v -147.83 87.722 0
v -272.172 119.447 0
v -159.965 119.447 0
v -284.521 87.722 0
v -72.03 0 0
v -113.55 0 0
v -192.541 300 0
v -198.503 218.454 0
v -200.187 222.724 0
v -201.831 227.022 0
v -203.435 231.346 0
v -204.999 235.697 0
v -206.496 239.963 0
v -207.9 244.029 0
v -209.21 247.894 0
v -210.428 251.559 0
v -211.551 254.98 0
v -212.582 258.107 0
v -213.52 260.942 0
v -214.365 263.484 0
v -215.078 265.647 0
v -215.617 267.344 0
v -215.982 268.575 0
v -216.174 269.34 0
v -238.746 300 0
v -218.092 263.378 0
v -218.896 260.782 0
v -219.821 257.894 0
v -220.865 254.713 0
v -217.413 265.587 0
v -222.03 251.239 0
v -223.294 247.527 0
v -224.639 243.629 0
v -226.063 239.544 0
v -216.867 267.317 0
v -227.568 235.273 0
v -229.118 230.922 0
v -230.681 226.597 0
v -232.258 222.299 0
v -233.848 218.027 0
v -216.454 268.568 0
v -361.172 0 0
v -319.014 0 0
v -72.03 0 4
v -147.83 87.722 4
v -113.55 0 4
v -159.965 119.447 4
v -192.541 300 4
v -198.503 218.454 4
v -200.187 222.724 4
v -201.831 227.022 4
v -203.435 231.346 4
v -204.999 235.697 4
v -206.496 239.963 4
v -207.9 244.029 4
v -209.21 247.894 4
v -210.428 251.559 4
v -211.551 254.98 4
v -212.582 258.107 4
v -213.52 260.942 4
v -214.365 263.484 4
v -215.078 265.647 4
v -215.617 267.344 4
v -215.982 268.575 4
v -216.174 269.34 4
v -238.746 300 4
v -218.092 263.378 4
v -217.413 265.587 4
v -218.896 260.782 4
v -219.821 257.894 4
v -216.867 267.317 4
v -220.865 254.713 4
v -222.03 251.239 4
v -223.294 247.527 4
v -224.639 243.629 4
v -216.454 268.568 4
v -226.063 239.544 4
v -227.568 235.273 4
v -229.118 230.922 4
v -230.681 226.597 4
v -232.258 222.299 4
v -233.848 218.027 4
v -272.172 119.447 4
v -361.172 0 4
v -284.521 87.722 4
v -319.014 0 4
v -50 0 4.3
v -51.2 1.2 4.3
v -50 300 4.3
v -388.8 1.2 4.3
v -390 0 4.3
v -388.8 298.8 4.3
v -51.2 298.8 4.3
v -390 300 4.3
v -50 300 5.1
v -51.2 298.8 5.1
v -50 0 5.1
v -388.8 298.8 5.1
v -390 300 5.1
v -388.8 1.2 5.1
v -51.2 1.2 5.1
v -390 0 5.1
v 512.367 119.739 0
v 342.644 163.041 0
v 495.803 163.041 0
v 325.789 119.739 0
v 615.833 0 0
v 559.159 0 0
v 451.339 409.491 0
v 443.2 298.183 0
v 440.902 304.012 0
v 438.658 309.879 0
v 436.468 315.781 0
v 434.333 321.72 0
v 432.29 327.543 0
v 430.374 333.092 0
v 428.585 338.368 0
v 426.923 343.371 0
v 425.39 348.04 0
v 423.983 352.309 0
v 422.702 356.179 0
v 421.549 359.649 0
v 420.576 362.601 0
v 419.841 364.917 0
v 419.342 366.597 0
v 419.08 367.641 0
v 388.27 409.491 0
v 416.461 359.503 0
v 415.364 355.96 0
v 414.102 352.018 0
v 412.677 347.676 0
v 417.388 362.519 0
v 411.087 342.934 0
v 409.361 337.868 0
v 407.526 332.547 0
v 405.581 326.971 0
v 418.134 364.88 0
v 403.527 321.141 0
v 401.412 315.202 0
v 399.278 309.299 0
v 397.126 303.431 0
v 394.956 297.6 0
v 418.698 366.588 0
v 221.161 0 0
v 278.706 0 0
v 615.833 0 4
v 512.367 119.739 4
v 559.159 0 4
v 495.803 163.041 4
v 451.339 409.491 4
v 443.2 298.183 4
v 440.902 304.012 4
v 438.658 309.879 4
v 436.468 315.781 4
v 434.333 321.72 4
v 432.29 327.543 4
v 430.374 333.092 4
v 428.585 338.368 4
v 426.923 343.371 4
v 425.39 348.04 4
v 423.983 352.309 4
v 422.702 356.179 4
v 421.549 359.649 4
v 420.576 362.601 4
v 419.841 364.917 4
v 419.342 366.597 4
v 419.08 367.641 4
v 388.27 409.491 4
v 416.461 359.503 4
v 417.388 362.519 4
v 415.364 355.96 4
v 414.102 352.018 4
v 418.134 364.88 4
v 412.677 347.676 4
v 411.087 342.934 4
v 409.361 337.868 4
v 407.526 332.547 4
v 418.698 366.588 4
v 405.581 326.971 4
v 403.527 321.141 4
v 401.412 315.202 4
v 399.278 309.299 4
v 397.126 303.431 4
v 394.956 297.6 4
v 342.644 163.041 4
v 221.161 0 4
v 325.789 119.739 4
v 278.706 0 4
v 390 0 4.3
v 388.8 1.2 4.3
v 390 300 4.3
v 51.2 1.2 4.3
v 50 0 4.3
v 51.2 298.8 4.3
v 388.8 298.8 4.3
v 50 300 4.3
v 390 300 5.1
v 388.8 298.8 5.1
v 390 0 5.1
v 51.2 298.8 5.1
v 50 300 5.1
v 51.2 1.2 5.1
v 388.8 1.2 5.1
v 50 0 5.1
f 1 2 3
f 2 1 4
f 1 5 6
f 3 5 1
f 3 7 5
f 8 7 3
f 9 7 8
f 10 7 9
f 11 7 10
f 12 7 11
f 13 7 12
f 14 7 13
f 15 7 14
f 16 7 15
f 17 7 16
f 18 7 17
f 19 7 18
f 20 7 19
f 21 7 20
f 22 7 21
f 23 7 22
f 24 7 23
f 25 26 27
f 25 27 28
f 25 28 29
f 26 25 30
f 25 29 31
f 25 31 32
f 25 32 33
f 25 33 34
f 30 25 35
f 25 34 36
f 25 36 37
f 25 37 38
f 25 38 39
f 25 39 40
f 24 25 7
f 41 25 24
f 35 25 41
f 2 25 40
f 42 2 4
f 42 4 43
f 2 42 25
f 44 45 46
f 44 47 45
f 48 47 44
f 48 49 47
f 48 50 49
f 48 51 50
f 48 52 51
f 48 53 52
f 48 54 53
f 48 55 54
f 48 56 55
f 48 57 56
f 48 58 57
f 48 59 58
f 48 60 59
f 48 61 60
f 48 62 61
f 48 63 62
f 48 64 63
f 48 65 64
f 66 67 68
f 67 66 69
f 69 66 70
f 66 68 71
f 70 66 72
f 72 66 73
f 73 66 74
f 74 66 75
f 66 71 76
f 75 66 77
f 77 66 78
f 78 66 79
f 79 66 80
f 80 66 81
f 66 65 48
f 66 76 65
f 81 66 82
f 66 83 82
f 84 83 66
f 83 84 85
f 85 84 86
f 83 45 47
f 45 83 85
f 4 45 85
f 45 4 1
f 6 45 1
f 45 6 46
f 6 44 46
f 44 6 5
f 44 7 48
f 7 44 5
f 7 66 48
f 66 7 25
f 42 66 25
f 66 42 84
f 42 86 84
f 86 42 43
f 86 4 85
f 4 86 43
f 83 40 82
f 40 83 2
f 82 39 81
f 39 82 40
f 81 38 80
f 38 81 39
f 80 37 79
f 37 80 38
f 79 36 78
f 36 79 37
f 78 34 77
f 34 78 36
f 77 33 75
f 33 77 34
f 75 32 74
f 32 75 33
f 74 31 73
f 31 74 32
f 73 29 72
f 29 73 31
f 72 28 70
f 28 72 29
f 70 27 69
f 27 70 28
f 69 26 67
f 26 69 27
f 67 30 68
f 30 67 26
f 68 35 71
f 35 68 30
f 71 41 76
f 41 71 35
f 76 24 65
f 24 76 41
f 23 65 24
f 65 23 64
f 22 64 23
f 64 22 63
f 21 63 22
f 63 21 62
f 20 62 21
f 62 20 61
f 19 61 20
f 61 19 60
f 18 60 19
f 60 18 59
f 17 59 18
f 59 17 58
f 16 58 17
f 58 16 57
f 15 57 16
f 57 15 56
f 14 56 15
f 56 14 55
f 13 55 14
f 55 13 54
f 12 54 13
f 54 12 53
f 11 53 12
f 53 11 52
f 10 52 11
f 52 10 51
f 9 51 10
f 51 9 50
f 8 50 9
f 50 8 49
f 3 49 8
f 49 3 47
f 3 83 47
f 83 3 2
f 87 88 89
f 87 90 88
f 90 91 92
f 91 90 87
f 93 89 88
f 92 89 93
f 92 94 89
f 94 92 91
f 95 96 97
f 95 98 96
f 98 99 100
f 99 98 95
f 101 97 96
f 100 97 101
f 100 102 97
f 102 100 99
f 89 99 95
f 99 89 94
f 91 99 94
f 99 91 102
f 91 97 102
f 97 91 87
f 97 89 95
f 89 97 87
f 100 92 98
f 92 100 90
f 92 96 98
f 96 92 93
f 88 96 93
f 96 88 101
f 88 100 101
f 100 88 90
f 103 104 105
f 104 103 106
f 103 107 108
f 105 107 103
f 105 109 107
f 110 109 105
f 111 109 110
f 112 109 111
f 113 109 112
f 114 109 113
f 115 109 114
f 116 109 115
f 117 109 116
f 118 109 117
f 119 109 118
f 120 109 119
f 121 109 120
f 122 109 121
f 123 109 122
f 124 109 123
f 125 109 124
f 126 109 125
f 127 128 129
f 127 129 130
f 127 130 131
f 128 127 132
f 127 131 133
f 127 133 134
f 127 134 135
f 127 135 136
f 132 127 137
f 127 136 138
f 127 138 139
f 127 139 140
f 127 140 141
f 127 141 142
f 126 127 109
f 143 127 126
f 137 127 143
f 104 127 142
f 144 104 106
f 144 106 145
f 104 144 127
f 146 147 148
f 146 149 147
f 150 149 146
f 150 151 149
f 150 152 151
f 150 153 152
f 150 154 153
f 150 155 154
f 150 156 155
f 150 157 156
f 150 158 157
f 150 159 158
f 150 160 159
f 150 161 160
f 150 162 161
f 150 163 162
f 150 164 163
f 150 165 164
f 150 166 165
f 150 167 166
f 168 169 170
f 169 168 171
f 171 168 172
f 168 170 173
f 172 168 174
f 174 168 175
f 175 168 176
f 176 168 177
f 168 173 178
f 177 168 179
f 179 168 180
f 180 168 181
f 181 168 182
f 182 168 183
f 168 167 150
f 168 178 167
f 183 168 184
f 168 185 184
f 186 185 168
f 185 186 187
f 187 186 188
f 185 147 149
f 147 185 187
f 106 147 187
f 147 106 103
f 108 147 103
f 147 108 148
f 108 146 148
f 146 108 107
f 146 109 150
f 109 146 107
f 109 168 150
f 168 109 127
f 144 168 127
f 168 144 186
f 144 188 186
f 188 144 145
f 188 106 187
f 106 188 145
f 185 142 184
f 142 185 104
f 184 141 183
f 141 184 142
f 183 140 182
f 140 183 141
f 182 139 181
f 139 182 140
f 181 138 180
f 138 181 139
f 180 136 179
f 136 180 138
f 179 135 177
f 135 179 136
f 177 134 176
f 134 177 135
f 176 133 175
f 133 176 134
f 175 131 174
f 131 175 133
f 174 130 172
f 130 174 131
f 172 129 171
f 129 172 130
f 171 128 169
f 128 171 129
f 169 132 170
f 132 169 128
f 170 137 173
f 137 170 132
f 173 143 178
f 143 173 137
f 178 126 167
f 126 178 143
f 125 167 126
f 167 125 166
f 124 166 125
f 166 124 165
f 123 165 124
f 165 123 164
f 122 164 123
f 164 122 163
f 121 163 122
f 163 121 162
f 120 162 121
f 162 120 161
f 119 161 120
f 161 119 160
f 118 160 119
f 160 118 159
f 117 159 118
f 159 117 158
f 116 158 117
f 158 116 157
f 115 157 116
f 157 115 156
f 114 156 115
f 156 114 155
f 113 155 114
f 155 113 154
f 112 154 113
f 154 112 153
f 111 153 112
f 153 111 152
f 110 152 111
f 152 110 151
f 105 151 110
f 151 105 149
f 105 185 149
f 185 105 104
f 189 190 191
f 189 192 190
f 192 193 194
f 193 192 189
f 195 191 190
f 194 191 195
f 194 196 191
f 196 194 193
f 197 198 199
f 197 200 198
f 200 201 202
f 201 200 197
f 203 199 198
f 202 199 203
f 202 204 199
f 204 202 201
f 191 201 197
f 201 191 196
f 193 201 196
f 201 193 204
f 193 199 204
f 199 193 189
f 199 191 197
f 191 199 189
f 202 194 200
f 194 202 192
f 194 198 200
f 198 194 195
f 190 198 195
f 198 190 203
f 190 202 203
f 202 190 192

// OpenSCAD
// file: ../geometry/normalized_profile_scene.scad
//////////////////////////////////////////////////////////////////////
// LibFile: normalized_profile_scene.scad
// Project: Glyph Dossier
// FileGroup: Exact-Height Diagnostic Rendering
// FileSummary: Whole normalized A with target-height reference bounds.
//////////////////////////////////////////////////////////////////////

module normalized_reference_bounds_2d(
    target_height,
    reference_half_width,
    line_width
) {
    difference() {
        translate([0, target_height / 2])
            square(
                [
                    2 * reference_half_width,
                    target_height
                ],
                center = true
            );

        translate([0, target_height / 2])
            square(
                [
                    max(
                        0.01,
                        2 * reference_half_width
                            - 2 * line_width
                    ),
                    max(
                        0.01,
                        target_height
                            - 2 * line_width
                    )
                ],
                center = true
            );
    }
}

module render_normalized_profile(
    dossier,
    source,
    method,
    target_height,
    probe_size,
    depth,
    manual_left,
    manual_right,
    manual_bottom,
    manual_top,
    show_bounds,
    bounds_line_width,
    reference_half_width
) {
    color([0.88, 0.68, 0.24])
        normalized_glyph_3d(
            dossier,
            source,
            method,
            target_height,
            probe_size,
            depth,
            manual_left,
            manual_right,
            manual_bottom,
            manual_top
        );

    if (show_bounds)
        color([0.20, 0.45, 0.85, 0.55])
            translate([0, 0, depth + 0.3])
                linear_extrude(height = 0.8)
                    normalized_reference_bounds_2d(
                        target_height,
                        reference_half_width,
                        bounds_line_width
                    );
}
// file: ../geometry/normalized_glyph.scad
//////////////////////////////////////////////////////////////////////
// LibFile: normalized_glyph.scad
// Project: Glyph Dossier
// FileGroup: Exact-Height Geometry
// FileSummary: Center-bottom glyph normalization by three methods.
//////////////////////////////////////////////////////////////////////

module _source_text_left_baseline_2d(
    dossier,
    source,
    probe_size
) {
    font_text_2d(
        dossier[GD_GLYPH],
        source[FS_FONT_NAME],
        probe_size,
        "left",
        "baseline"
    );
}

module _source_text_center_bottom_2d(
    dossier,
    source,
    probe_size
) {
    font_text_2d(
        dossier[GD_GLYPH],
        source[FS_FONT_NAME],
        probe_size,
        "center",
        "bottom"
    );
}

module _manual_normalized_glyph_2d(
    dossier,
    source,
    target_height,
    probe_size,
    left,
    right,
    bottom,
    top
) {
    scale_factor = exact_height_scale(
        target_height,
        bottom,
        top
    );

    translate([
        normalized_center_shift_x(
            left,
            right,
            scale_factor
        ),
        normalized_bottom_shift_y(
            bottom,
            scale_factor
        )
    ])
        scale([scale_factor, scale_factor])
            _source_text_left_baseline_2d(
                dossier,
                source,
                probe_size
            );
}

module _resize_normalized_glyph_2d(
    dossier,
    source,
    target_height,
    probe_size
) {
    resize(
        [0, target_height],
        auto = [true, false]
    )
        _source_text_center_bottom_2d(
            dossier,
            source,
            probe_size
        );
}

module _textmetrics_normalized_glyph_2d(
    dossier,
    source,
    target_height,
    probe_size
) {
    if (source[FS_FONT_NAME] == "")
        let(
            metrics = textmetrics(
                text = dossier[GD_GLYPH],
                size = probe_size,
                halign = "left",
                valign = "baseline"
            ),
            scale_factor =
                target_height / metrics.size.y,
            center_x =
                metrics.position.x
                + metrics.size.x / 2
        ) {
            echo("TEXTMETRICS_PROFILE", metrics);
            echo(
                "NORMALIZATION_SCALE",
                scale_factor
            );
            echo(
                "NORMALIZED_PROFILE_WIDTH_MM",
                metrics.size.x * scale_factor
            );
            echo(
                "NORMALIZED_PROFILE_HEIGHT_MM",
                target_height
            );

            translate([
                -center_x * scale_factor,
                -metrics.position.y * scale_factor
            ])
                scale([scale_factor, scale_factor])
                    _source_text_left_baseline_2d(
                        dossier,
                        source,
                        probe_size
                    );
        }
    else
        let(
            metrics = textmetrics(
                text = dossier[GD_GLYPH],
                size = probe_size,
                font = source[FS_FONT_NAME],
                halign = "left",
                valign = "baseline"
            ),
            scale_factor =
                target_height / metrics.size.y,
            center_x =
                metrics.position.x
                + metrics.size.x / 2
        ) {
            echo("TEXTMETRICS_PROFILE", metrics);
            echo(
                "NORMALIZATION_SCALE",
                scale_factor
            );
            echo(
                "NORMALIZED_PROFILE_WIDTH_MM",
                metrics.size.x * scale_factor
            );
            echo(
                "NORMALIZED_PROFILE_HEIGHT_MM",
                target_height
            );

            translate([
                -center_x * scale_factor,
                -metrics.position.y * scale_factor
            ])
                scale([scale_factor, scale_factor])
                    _source_text_left_baseline_2d(
                        dossier,
                        source,
                        probe_size
                    );
        }
}

module normalized_glyph_2d(
    dossier,
    source,
    method,
    target_height,
    probe_size,
    manual_left,
    manual_right,
    manual_bottom,
    manual_top
) {
    if (method == "manual")
        _manual_normalized_glyph_2d(
            dossier,
            source,
            target_height,
            probe_size,
            manual_left,
            manual_right,
            manual_bottom,
            manual_top
        );
    else if (method == "textmetrics")
        _textmetrics_normalized_glyph_2d(
            dossier,
            source,
            target_height,
            probe_size
        );
    else
        _resize_normalized_glyph_2d(
            dossier,
            source,
            target_height,
            probe_size
        );
}

module normalized_glyph_3d(
    dossier,
    source,
    method,
    target_height,
    probe_size,
    depth,
    manual_left,
    manual_right,
    manual_bottom,
    manual_top
) {
    linear_extrude(height = depth)
        normalized_glyph_2d(
            dossier,
            source,
            method,
            target_height,
            probe_size,
            manual_left,
            manual_right,
            manual_bottom,
            manual_top
        );
}
// file: ../geometry/glyph_profile.scad
//////////////////////////////////////////////////////////////////////
// LibFile: glyph_profile.scad
// Project: Glyph Dossier
// FileGroup: Source Adapter
// FileSummary: Font-backed text, glyph, source, and extrusion adapters.
//////////////////////////////////////////////////////////////////////

module font_text_2d(
    value,
    font_name,
    nominal_size,
    halign_value = "center",
    valign_value = "baseline"
) {
    if (font_name == "")
        text(
            text = value,
            size = nominal_size,
            halign = halign_value,
            valign = valign_value
        );
    else
        text(
            text = value,
            size = nominal_size,
            font = font_name,
            halign = halign_value,
            valign = valign_value
        );
}

module font_glyph_2d(glyph, font_name, nominal_size) {
    font_text_2d(
        glyph,
        font_name,
        nominal_size,
        "center",
        "baseline"
    );
}

module glyph_source_2d(
    dossier,
    source_kind,
    font_name,
    nominal_size
) {
    assert(
        source_kind == "font",
        str("Source adapter does not implement kind: ", source_kind)
    );

    font_glyph_2d(
        dossier[GD_GLYPH],
        font_name,
        nominal_size
    );
}

module glyph_profile_3d(
    dossier,
    source_kind,
    font_name,
    nominal_size,
    depth
) {
    linear_extrude(height = depth)
        glyph_source_2d(
            dossier,
            source_kind,
            font_name,
            nominal_size
        );
}

module glyph_source_record_2d(
    dossier,
    source,
    nominal_size
) {
    glyph_source_2d(
        dossier,
        source[FS_KIND],
        source[FS_FONT_NAME],
        nominal_size
    );
}

module glyph_source_record_3d(
    dossier,
    source,
    nominal_size,
    depth
) {
    glyph_profile_3d(
        dossier,
        source[FS_KIND],
        source[FS_FONT_NAME],
        nominal_size,
        depth
    );
}
// file: ../lib/normalization.scad
//////////////////////////////////////////////////////////////////////
// LibFile: normalization.scad
// Project: Glyph Dossier
// FileGroup: Normalization Mathematics
// FileSummary: Manual-bound scale and final-dimension calculations.
//////////////////////////////////////////////////////////////////////

function profile_bounds_known(
    left,
    right,
    bottom,
    top
) =
    left != OBS_UNKNOWN
    && right != OBS_UNKNOWN
    && bottom != OBS_UNKNOWN
    && top != OBS_UNKNOWN;

function profile_bounds_valid(
    left,
    right,
    bottom,
    top
) =
    profile_bounds_known(left, right, bottom, top)
    && left < right
    && bottom < top;

function profile_observed_width(left, right) =
    right - left;

function profile_observed_height(bottom, top) =
    top - bottom;

function exact_height_scale(
    target_height,
    observed_bottom,
    observed_top
) =
    target_height
    / profile_observed_height(
        observed_bottom,
        observed_top
    );

function normalized_profile_width(
    target_height,
    observed_left,
    observed_right,
    observed_bottom,
    observed_top
) =
    profile_observed_width(
        observed_left,
        observed_right
    )
    * exact_height_scale(
        target_height,
        observed_bottom,
        observed_top
    );

function normalized_center_shift_x(
    observed_left,
    observed_right,
    scale_factor
) =
    -(
        observed_left + observed_right
    ) / 2 * scale_factor;

function normalized_bottom_shift_y(
    observed_bottom,
    scale_factor
) =
    -observed_bottom * scale_factor;
// file: ../lib/lookup.scad
//////////////////////////////////////////////////////////////////////
// LibFile: lookup.scad
// Project: Glyph Dossier
// FileGroup: Exact Lookup
// FileSummary: Requires exact records and source-glyph observations.
//////////////////////////////////////////////////////////////////////

function named_matches(records, name) = [
    for (record = records)
        if (record_name(record) == name)
            record
];

function named_record(records, name, record_kind = "record") =
    let(matches = named_matches(records, name))
    assert(
        len(matches) == 1,
        str(
            "Expected exactly one ",
            record_kind,
            " named ",
            name,
            "; found ",
            len(matches)
        )
    )
    matches[0];

function exact_name_count(records, name) =
    len(named_matches(records, name));

function observation_matches(
    records,
    source_id,
    glyph_id
) = [
    for (record = records)
        if (
            record[OB_SOURCE_ID] == source_id
            && record[OB_GLYPH_ID] == glyph_id
        )
            record
];

function exact_observation_count(
    records,
    source_id,
    glyph_id
) =
    len(observation_matches(records, source_id, glyph_id));

function source_glyph_observation(
    records,
    source_id,
    glyph_id
) =
    let(matches = observation_matches(records, source_id, glyph_id))
    assert(
        len(matches) == 1,
        str(
            "Expected one observation for source ",
            source_id,
            " and glyph ",
            glyph_id,
            "; found ",
            len(matches)
        )
    )
    matches[0];
// file: ../config/workbenches.scad
//////////////////////////////////////////////////////////////////////
// LibFile: workbenches.scad
// Project: Glyph Dossier
// FileGroup: Workbench Contracts
// FileSummary: Declares supported workbenches and render modes.
//////////////////////////////////////////////////////////////////////

VALID_WORKBENCHES = [
    "development",
    "laboratory",
    "profile",
    "contact_sheet",
    "font_source",
    "font_inventory",
    "glyph_observation",
    "glyph_comparison",
    "source_contact_sheet",
    "a_normalized_profile",
    "a_section_plan",
    "a_section_layout",
    "a_section_export",
    "catalog"
];

VALID_RENDER_MODES = [
    "dossier",
    "profile_2d",
    "profile_3d",
    "contact_sheet",
    "source_sample",
    "font_inventory",
    "observation",
    "comparison",
    "source_contact_sheet",
    "a_normalized_profile",
    "a_section_plan",
    "a_section_layout",
    "a_section_export",
    "report_only"
];

VALID_SOURCE_KINDS = [
    "font"
];

VALID_PROBE_ORIENTATIONS = [
    "horizontal",
    "vertical"
];

VALID_NORMALIZATION_METHODS = [
    "resize",
    "manual",
    "textmetrics"
];

function value_in_list(values, value) =
    len([for (candidate = values) if (candidate == value) candidate]) > 0;

module validate_workbench_selection(
    workbench_name,
    render_mode,
    source_kind,
    stroke_probe_orientation = "vertical",
    gap_probe_orientation = "horizontal"
) {
    assert(
        value_in_list(VALID_WORKBENCHES, workbench_name),
        str("Unknown workbench: ", workbench_name)
    );
    assert(
        value_in_list(VALID_RENDER_MODES, render_mode),
        str("Unknown render mode: ", render_mode)
    );
    assert(
        value_in_list(VALID_SOURCE_KINDS, source_kind),
        str("Unsupported source kind: ", source_kind)
    );
    assert(
        value_in_list(
            VALID_PROBE_ORIENTATIONS,
            stroke_probe_orientation
        ),
        str(
            "Unknown stroke probe orientation: ",
            stroke_probe_orientation
        )
    );
    assert(
        value_in_list(
            VALID_PROBE_ORIENTATIONS,
            gap_probe_orientation
        ),
        str(
            "Unknown gap probe orientation: ",
            gap_probe_orientation
        )
    );
}
// file: ../config/sources.scad
//////////////////////////////////////////////////////////////////////
// LibFile: sources.scad
// Project: Glyph Dossier
// FileGroup: Registry Routing
// FileSummary: Exposes configurable laboratory font sources.
//////////////////////////////////////////////////////////////////////

FONT_SOURCES = LABORATORY_FONT_SOURCES;
// file: ../registries/laboratory_sources.scad
//////////////////////////////////////////////////////////////////////
// LibFile: laboratory_sources.scad
// Project: Glyph Dossier
// FileGroup: Mutable Source Registry
// FileSummary: Three stable configurable font-source identities.
//////////////////////////////////////////////////////////////////////

LABORATORY_FONT_SOURCES = [
    font_source(
        "SRC_1",
        "font",
        wb_source_1_label,
        wb_source_1_font_name,
        wb_source_1_license,
        wb_source_1_url,
        wb_source_1_revision,
        "active"
    ),
    font_source(
        "SRC_2",
        "font",
        wb_source_2_label,
        wb_source_2_font_name,
        wb_source_2_license,
        wb_source_2_url,
        wb_source_2_revision,
        "active"
    ),
    font_source(
        "SRC_3",
        "font",
        wb_source_3_label,
        wb_source_3_font_name,
        wb_source_3_license,
        wb_source_3_url,
        wb_source_3_revision,
        "active"
    )
];
// file: ../config/glyphs.scad
//////////////////////////////////////////////////////////////////////
// LibFile: glyphs.scad
// Project: Glyph Dossier
// FileGroup: Registry Composition
// FileSummary: Exposes the complete character-analysis registry.
//////////////////////////////////////////////////////////////////////

ALL_GLYPHS = concat(
    UPPERCASE_GLYPHS,
    LOWERCASE_GLYPHS,
    DIGIT_GLYPHS,
    PUNCTUATION_GLYPHS
);
// file: ../registries/punctuation.scad
//////////////////////////////////////////////////////////////////////
// LibFile: punctuation_glyphs.scad
// Project: Glyph Dossier
// FileGroup: Character Registry
// FileSummary: Character-level dossiers for question, exclamation, colon, and semicolon.
//////////////////////////////////////////////////////////////////////

PUNCTUATION_GLYPHS = [
    glyph_dossier(
        "P_question",
        "?",
        "punctuation",
        "curved_mark_dot",
        2,
        2,
        0,
        0,
        "cap_punctuation",
        ["upper_curve", "narrow_transition", "terminal", "separate_dot"],
        ["dot_loss", "component_assignment", "curve_cut", "narrow_transition"],
        ["curve_shape", "dot_shape", "terminal_angle"],
        "primary",
        "Primary punctuation test combining a complex main mark and separate dot."
    ),
    glyph_dossier(
        "P_exclamation",
        "!",
        "punctuation",
        "stem_dot",
        2,
        2,
        0,
        0,
        "cap_punctuation",
        ["main_stem", "separate_dot"],
        ["dot_loss", "stem_fragment", "component_assignment"],
        ["tapered_stem", "rectangular_stem", "dot_shape"],
        "primary",
        "Primary two-component punctuation control glyph."
    ),
    glyph_dossier(
        "P_colon",
        ":",
        "punctuation",
        "paired_dots",
        2,
        2,
        0,
        0,
        "x_punctuation",
        ["upper_dot", "lower_dot"],
        ["component_loss", "component_assignment", "small_part"],
        ["round_dots", "square_dots"],
        "primary",
        "Primary test consisting entirely of disconnected small components."
    ),
    glyph_dossier(
        "P_semicolon",
        ";",
        "punctuation",
        "dot_descending_mark",
        2,
        2,
        0,
        0,
        "descender_punctuation",
        ["upper_dot", "lower_comma_tail"],
        ["component_loss", "tail_fragment", "component_assignment"],
        ["tail_angle", "dot_shape"],
        "primary",
        "Tests disconnected punctuation with a descending curved component."
    )
];
// file: ../registries/digits.scad
//////////////////////////////////////////////////////////////////////
// LibFile: digit_glyphs.scad
// Project: Glyph Dossier
// FileGroup: Character Registry
// FileSummary: Character-level dossiers for digits 0 through 9.
//////////////////////////////////////////////////////////////////////

DIGIT_GLYPHS = [
    glyph_dossier(
        "D_0",
        "0",
        "digit",
        "closed_ring",
        1,
        1,
        1,
        1,
        "digit_height",
        ["outer_curve", "counter", "continuous_ring"],
        ["counter_collapse", "ring_thickness_loss", "letter_confusion"],
        ["slashed_zero", "dotted_zero", "oval_width"],
        "primary",
        "Primary digit ring test and distinction from uppercase O."
    ),
    glyph_dossier(
        "D_1",
        "1",
        "digit",
        "stem_flag_base",
        1,
        1,
        0,
        0,
        "digit_height",
        ["main_stem", "possible_flag", "possible_base"],
        ["narrow_part", "flag_fragment", "base_fragment"],
        ["plain_stem", "top_flag", "bottom_base", "serifed"],
        "primary",
        "Primary font-variation and narrow-digit test."
    ),
    glyph_dossier(
        "D_2",
        "2",
        "digit",
        "curve_diagonal_base",
        1,
        1,
        0,
        0,
        "digit_height",
        ["upper_curve", "diagonal_transition", "bottom_bar"],
        ["curve_diagonal_cut", "bottom_bar_fragment", "thin_transition"],
        ["flat_or_curved_base", "diagonal_angle"],
        "primary",
        "Primary mixed curve, diagonal, and horizontal test."
    ),
    glyph_dossier(
        "D_3",
        "3",
        "digit",
        "double_open_bowl",
        1,
        1,
        0,
        0,
        "digit_height",
        ["upper_curve", "lower_curve", "central_waist"],
        ["waist_fragment", "curve_cut", "terminal_fragment"],
        ["upper_lower_balance", "flat_or_rounded_spine"],
        "coverage",
        "Tests two open curved lobes and a narrow waist."
    ),
    glyph_dossier(
        "D_4",
        "4",
        "digit",
        "crossbar_diagonal_stem",
        1,
        1,
        0,
        1,
        "digit_height",
        ["diagonal", "vertical_stem", "crossbar", "possible_counter"],
        ["form_substitution", "crossbar_cut", "counter_collapse", "junction_cut"],
        ["open_four", "closed_four", "crossbar_height"],
        "primary",
        "Primary digit form-variation and junction test."
    ),
    glyph_dossier(
        "D_5",
        "5",
        "digit",
        "top_stem_lower_curve",
        1,
        1,
        0,
        0,
        "digit_height",
        ["top_bar", "upper_stem", "lower_curve"],
        ["curve_stem_cut", "top_bar_fragment", "waist_fragment"],
        ["flat_or_curved_top", "lower_bowl_size"],
        "coverage",
        "Tests abrupt transition from rectilinear to curved geometry."
    ),
    glyph_dossier(
        "D_6",
        "6",
        "digit",
        "loop_open_tail",
        1,
        1,
        1,
        1,
        "digit_height",
        ["lower_loop", "counter", "upper_open_curve"],
        ["counter_collapse", "neck_cut", "terminal_fragment"],
        ["loop_size", "terminal_angle"],
        "coverage",
        "Tests one counter with an open upper continuation."
    ),
    glyph_dossier(
        "D_7",
        "7",
        "digit",
        "topbar_diagonal",
        1,
        1,
        0,
        0,
        "digit_height",
        ["top_bar", "long_diagonal", "possible_crossbar"],
        ["diagonal_cut", "top_bar_fragment", "crossbar_fragment"],
        ["crossed_seven", "plain_seven", "serifed"],
        "coverage",
        "Tests a long diagonal and optional crossbar."
    ),
    glyph_dossier(
        "D_8",
        "8",
        "digit",
        "double_closed_loop",
        1,
        1,
        2,
        2,
        "digit_height",
        ["upper_loop", "lower_loop", "two_counters", "central_waist"],
        ["counter_collapse", "waist_fragment", "loop_boundary_cut"],
        ["upper_lower_balance", "waist_width"],
        "primary",
        "Primary two-counter digit test."
    ),
    glyph_dossier(
        "D_9",
        "9",
        "digit",
        "loop_descending_tail",
        1,
        1,
        1,
        1,
        "digit_height",
        ["upper_loop", "counter", "lower_open_tail"],
        ["counter_collapse", "neck_cut", "tail_fragment"],
        ["loop_size", "tail_angle"],
        "coverage",
        "Tests one upper counter with a descending open continuation."
    )
];
// file: ../lib/schema.scad
//////////////////////////////////////////////////////////////////////
// LibFile: schema.scad
// Project: Glyph Dossier
// FileGroup: Record Schema
// FileSummary: Project, glyph, source, and observation records.
//////////////////////////////////////////////////////////////////////

PR_NAME = 0;
PR_KIND = 1;
PR_EDITION = 2;
PR_SCOPE = 3;
PR_BASELINE = 4;
PR_STATUS = 5;

function glyph_project(
    name,
    kind,
    edition,
    scope,
    baseline,
    status
) = [
    name,
    kind,
    edition,
    scope,
    baseline,
    status
];

GD_ID = 0;
GD_GLYPH = 1;
GD_GROUP = 2;
GD_ARCHETYPE = 3;
GD_COMPONENTS_MIN = 4;
GD_COMPONENTS_MAX = 5;
GD_COUNTERS_MIN = 6;
GD_COUNTERS_MAX = 7;
GD_VERTICAL_CLASS = 8;
GD_FEATURES = 9;
GD_RISKS = 10;
GD_VARIANTS = 11;
GD_PRIORITY = 12;
GD_NOTE = 13;

function glyph_dossier(
    id,
    glyph,
    group,
    archetype,
    components_min,
    components_max,
    counters_min,
    counters_max,
    vertical_class,
    features,
    risks,
    variants,
    priority,
    note
) = [
    id,
    glyph,
    group,
    archetype,
    components_min,
    components_max,
    counters_min,
    counters_max,
    vertical_class,
    features,
    risks,
    variants,
    priority,
    note
];

FS_ID = 0;
FS_KIND = 1;
FS_LABEL = 2;
FS_FONT_NAME = 3;
FS_LICENSE = 4;
FS_URL = 5;
FS_REVISION = 6;
FS_STATUS = 7;

function font_source(
    id,
    kind,
    label,
    font_name,
    license_name,
    source_url,
    revision,
    status
) = [
    id,
    kind,
    label,
    font_name,
    license_name,
    source_url,
    revision,
    status
];

OBS_UNKNOWN = -999999;

OB_ID = 0;
OB_SOURCE_ID = 1;
OB_GLYPH_ID = 2;
OB_STATUS = 3;
OB_VARIANT = 4;
OB_COMPONENTS = 5;
OB_COUNTERS = 6;
OB_LEFT = 7;
OB_RIGHT = 8;
OB_BOTTOM = 9;
OB_TOP = 10;
OB_MIN_STROKE = 11;
OB_MIN_GAP = 12;
OB_NOTE = 13;

function glyph_observation(
    id,
    source_id,
    glyph_id,
    status,
    variant,
    components,
    counters,
    left_extent,
    right_extent,
    bottom_extent,
    top_extent,
    minimum_stroke,
    minimum_gap,
    note
) = [
    id,
    source_id,
    glyph_id,
    status,
    variant,
    components,
    counters,
    left_extent,
    right_extent,
    bottom_extent,
    top_extent,
    minimum_stroke,
    minimum_gap,
    note
];

function observation_value_known(value) =
    value != OBS_UNKNOWN;

function observation_has_bounds(observation) =
    observation_value_known(observation[OB_LEFT])
    && observation_value_known(observation[OB_RIGHT])
    && observation_value_known(observation[OB_BOTTOM])
    && observation_value_known(observation[OB_TOP]);

function observation_width(observation) =
    observation_has_bounds(observation)
    ? observation[OB_RIGHT] - observation[OB_LEFT]
    : OBS_UNKNOWN;

function observation_height(observation) =
    observation_has_bounds(observation)
    ? observation[OB_TOP] - observation[OB_BOTTOM]
    : OBS_UNKNOWN;

function record_name(record) = record[0];
// main file
//////////////////////////////////////////////////////////////////////
// LibFile: normalized_a_render_contract.scad
// Project: Glyph Dossier
// FileGroup: Contract Tests
// FileSummary: Portable resize and manual normalization geometry.
//////////////////////////////////////////////////////////////////////

include <../lib/schema.scad>
include <../config/defaults.scad>

include <../registries/uppercase.scad>
include <../registries/lowercase.scad>
include <../registries/digits.scad>
include <../registries/punctuation.scad>
include <../config/glyphs.scad>

include <../registries/laboratory_sources.scad>
include <../config/sources.scad>

include <../config/workbenches.scad>
include <../lib/lookup.scad>
include <../lib/normalization.scad>
include <../lib/validation.scad>

include <../geometry/glyph_profile.scad>
include <../geometry/normalized_glyph.scad>
include <../geometry/normalized_profile_scene.scad>

dossier = named_record(
    ALL_GLYPHS,
    "U_A",
    "normalized A dossier"
);

source = named_record(
    FONT_SOURCES,
    "SRC_1",
    "normalized A source"
);

validate_normalization(
    dossier,
    "resize",
    300,
    100,
    OBS_UNKNOWN,
    OBS_UNKNOWN,
    OBS_UNKNOWN,
    OBS_UNKNOWN
);

validate_normalization(
    dossier,
    "manual",
    300,
    100,
    -35,
    35,
    0,
    70
);

translate([-220, 0, 0])
    render_normalized_profile(
        dossier,
        source,
        "resize",
        300,
        100,
        4,
        OBS_UNKNOWN,
        OBS_UNKNOWN,
        OBS_UNKNOWN,
        OBS_UNKNOWN,
        true,
        1.2,
        170
    );

translate([220, 0, 0])
    render_normalized_profile(
        dossier,
        source,
        "manual",
        300,
        100,
        4,
        -35,
        35,
        0,
        70,
        true,
        1.2,
        170
    );

echo("PASS", "normalized_a_render_contract");
